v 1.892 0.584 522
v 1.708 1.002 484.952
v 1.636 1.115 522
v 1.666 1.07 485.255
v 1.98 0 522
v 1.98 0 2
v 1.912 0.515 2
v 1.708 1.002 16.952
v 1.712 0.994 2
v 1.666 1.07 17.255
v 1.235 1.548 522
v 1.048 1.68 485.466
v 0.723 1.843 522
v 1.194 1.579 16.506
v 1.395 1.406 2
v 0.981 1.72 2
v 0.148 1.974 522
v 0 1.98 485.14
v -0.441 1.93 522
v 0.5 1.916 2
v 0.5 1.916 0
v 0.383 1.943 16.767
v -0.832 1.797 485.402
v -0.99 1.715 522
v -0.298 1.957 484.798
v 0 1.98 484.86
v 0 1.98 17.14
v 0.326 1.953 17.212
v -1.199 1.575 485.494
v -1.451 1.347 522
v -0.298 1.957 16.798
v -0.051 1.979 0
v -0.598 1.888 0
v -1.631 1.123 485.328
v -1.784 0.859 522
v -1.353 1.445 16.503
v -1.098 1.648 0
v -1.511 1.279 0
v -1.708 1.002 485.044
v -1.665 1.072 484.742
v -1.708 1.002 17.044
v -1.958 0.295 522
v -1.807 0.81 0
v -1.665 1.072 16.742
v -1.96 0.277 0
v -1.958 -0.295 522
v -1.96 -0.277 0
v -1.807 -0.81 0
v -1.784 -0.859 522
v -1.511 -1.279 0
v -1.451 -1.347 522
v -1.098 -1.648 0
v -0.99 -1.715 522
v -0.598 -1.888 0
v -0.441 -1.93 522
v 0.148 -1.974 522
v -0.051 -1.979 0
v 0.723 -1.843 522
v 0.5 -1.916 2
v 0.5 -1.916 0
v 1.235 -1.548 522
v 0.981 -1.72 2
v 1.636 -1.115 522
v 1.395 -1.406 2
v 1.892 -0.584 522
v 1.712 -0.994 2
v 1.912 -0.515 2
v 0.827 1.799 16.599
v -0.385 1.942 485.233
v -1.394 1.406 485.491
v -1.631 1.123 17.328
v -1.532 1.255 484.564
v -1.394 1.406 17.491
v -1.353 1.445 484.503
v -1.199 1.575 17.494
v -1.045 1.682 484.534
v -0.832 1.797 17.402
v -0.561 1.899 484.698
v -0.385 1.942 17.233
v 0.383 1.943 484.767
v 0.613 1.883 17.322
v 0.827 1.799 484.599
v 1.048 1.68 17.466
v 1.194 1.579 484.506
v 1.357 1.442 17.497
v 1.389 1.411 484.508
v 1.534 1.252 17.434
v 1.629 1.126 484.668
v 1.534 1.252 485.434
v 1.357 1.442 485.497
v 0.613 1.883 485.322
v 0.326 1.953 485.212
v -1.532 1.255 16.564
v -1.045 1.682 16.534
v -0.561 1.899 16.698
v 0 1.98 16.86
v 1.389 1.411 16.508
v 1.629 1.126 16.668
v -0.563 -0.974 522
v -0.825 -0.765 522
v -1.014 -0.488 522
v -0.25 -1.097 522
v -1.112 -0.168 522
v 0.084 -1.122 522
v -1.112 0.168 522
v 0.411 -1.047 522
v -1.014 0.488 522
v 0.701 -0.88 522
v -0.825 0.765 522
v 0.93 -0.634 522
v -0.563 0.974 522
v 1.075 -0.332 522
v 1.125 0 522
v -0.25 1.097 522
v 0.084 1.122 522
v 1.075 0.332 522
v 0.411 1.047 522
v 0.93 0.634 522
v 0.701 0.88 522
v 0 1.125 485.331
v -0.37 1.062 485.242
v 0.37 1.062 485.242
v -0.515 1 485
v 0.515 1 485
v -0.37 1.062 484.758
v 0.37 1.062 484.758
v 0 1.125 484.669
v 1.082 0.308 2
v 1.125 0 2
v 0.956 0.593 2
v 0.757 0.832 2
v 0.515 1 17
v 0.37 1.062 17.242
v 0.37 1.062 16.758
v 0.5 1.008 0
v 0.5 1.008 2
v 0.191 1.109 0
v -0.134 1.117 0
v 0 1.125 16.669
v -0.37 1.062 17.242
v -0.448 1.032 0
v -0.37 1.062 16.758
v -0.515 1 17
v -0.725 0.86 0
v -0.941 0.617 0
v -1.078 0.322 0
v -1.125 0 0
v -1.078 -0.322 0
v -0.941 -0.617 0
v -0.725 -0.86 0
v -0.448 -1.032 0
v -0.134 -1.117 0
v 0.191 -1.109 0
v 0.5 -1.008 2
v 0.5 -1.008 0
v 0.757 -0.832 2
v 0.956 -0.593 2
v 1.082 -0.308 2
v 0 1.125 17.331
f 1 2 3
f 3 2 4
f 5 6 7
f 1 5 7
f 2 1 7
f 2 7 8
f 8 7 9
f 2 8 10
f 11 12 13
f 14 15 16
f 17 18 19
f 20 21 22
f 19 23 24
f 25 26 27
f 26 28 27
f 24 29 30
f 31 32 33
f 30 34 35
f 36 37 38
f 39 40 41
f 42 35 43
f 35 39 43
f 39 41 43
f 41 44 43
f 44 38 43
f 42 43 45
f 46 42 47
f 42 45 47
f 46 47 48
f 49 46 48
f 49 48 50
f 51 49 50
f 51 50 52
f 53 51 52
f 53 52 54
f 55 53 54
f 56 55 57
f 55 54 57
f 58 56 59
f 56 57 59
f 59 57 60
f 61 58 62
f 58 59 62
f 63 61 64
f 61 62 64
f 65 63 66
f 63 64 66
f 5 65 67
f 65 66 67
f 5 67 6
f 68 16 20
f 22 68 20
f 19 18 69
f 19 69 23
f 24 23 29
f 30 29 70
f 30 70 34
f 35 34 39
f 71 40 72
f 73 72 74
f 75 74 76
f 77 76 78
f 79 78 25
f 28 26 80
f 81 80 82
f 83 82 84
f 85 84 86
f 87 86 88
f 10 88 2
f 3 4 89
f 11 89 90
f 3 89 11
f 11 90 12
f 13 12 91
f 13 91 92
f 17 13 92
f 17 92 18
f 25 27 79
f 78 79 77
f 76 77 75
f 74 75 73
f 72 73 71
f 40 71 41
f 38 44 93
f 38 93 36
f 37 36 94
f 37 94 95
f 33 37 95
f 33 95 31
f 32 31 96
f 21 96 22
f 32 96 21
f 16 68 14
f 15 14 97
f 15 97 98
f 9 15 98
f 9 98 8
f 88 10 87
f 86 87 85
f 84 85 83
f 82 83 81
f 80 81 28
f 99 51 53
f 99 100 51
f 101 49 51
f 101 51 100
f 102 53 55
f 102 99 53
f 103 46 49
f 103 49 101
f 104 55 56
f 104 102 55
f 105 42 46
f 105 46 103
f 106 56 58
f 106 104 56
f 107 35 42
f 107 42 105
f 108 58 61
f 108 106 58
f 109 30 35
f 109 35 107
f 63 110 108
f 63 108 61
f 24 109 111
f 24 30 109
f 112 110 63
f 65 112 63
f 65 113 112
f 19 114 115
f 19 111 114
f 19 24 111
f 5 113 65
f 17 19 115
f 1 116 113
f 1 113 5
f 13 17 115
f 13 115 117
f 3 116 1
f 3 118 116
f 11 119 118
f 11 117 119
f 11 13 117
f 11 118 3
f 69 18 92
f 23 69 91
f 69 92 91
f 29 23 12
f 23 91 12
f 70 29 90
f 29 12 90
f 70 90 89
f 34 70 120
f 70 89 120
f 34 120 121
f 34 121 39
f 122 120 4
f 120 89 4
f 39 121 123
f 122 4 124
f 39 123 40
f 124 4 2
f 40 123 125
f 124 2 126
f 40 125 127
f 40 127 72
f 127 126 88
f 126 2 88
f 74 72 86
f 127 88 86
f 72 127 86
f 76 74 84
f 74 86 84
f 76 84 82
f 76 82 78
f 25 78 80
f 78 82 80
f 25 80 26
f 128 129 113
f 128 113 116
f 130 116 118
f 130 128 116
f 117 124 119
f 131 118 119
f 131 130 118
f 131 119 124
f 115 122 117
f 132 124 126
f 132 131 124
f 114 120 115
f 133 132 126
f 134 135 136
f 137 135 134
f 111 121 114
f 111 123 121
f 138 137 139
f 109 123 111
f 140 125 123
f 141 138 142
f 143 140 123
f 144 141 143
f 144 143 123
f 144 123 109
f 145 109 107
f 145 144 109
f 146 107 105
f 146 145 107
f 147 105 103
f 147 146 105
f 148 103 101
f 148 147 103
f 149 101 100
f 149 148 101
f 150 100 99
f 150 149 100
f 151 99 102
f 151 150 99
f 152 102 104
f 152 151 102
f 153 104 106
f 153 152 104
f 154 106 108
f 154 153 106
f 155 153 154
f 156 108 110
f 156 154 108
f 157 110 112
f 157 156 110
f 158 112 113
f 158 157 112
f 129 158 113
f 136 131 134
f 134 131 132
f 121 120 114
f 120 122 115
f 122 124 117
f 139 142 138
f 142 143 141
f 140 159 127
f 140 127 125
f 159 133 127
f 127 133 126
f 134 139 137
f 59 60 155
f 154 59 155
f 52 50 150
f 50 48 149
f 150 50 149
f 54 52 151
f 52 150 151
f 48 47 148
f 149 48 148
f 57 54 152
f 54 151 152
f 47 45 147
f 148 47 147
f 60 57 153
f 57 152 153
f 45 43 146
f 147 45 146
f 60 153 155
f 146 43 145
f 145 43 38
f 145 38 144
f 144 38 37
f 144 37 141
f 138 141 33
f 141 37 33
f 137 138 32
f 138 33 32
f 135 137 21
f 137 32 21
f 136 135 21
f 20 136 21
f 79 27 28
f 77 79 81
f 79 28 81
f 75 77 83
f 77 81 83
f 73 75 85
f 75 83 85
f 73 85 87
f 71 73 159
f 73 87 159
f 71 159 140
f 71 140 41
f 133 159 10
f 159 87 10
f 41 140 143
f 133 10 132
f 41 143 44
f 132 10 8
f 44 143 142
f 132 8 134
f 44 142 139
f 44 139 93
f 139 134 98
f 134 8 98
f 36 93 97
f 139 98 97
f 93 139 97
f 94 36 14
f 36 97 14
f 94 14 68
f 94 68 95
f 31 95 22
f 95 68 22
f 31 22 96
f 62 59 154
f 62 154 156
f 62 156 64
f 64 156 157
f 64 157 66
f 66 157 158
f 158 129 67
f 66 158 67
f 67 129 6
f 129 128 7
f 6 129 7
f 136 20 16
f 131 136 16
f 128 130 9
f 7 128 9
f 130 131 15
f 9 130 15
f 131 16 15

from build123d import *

# Parameters (mm, degrees)
SKETCH1_R           = 1.98
SKETCH1_R_2         = 1.125
EXTRUDE1_DEPTH      = 522
SKETCH2_R           = 0.5
EXTRUDE2_DEPTH      = 2.98
EXTRUDE2_DEPTH_BACK = 2.98
SKETCH3_W           = 2.698417422
SKETCH3_H           = 6
EXTRUDE5_DEPTH      = 2


with BuildPart() as part:
    # Sketch1 → Extrude1 (new body)
    with BuildSketch(Plane.XY):
        Circle(SKETCH1_R)
        Circle(SKETCH1_R_2, mode=Mode.SUBTRACT)
    extrude(amount=EXTRUDE1_DEPTH)

    # Sketch2 → Extrude2 (cut, two sides)
    with BuildSketch(Plane(origin=(0, 0, 0), x_dir=(0, 0, -1), z_dir=(1, 0, 0))) as extrude2_sk:
        with Locations((-485, 1.5)):
            Circle(SKETCH2_R)
        with Locations((-17, 1.5)):
            Circle(SKETCH2_R)
    extrude(amount=EXTRUDE2_DEPTH, mode=Mode.SUBTRACT)
    extrude(extrude2_sk.sketch, amount=-EXTRUDE2_DEPTH_BACK, mode=Mode.SUBTRACT)

    # Sketch3 → Extrude5 (cut)
    with BuildSketch(Plane.XY):
        with Locations((1.849208711, 0)):
            Rectangle(SKETCH3_W, SKETCH3_H)
    extrude(amount=EXTRUDE5_DEPTH, mode=Mode.SUBTRACT)


solid = part.part
